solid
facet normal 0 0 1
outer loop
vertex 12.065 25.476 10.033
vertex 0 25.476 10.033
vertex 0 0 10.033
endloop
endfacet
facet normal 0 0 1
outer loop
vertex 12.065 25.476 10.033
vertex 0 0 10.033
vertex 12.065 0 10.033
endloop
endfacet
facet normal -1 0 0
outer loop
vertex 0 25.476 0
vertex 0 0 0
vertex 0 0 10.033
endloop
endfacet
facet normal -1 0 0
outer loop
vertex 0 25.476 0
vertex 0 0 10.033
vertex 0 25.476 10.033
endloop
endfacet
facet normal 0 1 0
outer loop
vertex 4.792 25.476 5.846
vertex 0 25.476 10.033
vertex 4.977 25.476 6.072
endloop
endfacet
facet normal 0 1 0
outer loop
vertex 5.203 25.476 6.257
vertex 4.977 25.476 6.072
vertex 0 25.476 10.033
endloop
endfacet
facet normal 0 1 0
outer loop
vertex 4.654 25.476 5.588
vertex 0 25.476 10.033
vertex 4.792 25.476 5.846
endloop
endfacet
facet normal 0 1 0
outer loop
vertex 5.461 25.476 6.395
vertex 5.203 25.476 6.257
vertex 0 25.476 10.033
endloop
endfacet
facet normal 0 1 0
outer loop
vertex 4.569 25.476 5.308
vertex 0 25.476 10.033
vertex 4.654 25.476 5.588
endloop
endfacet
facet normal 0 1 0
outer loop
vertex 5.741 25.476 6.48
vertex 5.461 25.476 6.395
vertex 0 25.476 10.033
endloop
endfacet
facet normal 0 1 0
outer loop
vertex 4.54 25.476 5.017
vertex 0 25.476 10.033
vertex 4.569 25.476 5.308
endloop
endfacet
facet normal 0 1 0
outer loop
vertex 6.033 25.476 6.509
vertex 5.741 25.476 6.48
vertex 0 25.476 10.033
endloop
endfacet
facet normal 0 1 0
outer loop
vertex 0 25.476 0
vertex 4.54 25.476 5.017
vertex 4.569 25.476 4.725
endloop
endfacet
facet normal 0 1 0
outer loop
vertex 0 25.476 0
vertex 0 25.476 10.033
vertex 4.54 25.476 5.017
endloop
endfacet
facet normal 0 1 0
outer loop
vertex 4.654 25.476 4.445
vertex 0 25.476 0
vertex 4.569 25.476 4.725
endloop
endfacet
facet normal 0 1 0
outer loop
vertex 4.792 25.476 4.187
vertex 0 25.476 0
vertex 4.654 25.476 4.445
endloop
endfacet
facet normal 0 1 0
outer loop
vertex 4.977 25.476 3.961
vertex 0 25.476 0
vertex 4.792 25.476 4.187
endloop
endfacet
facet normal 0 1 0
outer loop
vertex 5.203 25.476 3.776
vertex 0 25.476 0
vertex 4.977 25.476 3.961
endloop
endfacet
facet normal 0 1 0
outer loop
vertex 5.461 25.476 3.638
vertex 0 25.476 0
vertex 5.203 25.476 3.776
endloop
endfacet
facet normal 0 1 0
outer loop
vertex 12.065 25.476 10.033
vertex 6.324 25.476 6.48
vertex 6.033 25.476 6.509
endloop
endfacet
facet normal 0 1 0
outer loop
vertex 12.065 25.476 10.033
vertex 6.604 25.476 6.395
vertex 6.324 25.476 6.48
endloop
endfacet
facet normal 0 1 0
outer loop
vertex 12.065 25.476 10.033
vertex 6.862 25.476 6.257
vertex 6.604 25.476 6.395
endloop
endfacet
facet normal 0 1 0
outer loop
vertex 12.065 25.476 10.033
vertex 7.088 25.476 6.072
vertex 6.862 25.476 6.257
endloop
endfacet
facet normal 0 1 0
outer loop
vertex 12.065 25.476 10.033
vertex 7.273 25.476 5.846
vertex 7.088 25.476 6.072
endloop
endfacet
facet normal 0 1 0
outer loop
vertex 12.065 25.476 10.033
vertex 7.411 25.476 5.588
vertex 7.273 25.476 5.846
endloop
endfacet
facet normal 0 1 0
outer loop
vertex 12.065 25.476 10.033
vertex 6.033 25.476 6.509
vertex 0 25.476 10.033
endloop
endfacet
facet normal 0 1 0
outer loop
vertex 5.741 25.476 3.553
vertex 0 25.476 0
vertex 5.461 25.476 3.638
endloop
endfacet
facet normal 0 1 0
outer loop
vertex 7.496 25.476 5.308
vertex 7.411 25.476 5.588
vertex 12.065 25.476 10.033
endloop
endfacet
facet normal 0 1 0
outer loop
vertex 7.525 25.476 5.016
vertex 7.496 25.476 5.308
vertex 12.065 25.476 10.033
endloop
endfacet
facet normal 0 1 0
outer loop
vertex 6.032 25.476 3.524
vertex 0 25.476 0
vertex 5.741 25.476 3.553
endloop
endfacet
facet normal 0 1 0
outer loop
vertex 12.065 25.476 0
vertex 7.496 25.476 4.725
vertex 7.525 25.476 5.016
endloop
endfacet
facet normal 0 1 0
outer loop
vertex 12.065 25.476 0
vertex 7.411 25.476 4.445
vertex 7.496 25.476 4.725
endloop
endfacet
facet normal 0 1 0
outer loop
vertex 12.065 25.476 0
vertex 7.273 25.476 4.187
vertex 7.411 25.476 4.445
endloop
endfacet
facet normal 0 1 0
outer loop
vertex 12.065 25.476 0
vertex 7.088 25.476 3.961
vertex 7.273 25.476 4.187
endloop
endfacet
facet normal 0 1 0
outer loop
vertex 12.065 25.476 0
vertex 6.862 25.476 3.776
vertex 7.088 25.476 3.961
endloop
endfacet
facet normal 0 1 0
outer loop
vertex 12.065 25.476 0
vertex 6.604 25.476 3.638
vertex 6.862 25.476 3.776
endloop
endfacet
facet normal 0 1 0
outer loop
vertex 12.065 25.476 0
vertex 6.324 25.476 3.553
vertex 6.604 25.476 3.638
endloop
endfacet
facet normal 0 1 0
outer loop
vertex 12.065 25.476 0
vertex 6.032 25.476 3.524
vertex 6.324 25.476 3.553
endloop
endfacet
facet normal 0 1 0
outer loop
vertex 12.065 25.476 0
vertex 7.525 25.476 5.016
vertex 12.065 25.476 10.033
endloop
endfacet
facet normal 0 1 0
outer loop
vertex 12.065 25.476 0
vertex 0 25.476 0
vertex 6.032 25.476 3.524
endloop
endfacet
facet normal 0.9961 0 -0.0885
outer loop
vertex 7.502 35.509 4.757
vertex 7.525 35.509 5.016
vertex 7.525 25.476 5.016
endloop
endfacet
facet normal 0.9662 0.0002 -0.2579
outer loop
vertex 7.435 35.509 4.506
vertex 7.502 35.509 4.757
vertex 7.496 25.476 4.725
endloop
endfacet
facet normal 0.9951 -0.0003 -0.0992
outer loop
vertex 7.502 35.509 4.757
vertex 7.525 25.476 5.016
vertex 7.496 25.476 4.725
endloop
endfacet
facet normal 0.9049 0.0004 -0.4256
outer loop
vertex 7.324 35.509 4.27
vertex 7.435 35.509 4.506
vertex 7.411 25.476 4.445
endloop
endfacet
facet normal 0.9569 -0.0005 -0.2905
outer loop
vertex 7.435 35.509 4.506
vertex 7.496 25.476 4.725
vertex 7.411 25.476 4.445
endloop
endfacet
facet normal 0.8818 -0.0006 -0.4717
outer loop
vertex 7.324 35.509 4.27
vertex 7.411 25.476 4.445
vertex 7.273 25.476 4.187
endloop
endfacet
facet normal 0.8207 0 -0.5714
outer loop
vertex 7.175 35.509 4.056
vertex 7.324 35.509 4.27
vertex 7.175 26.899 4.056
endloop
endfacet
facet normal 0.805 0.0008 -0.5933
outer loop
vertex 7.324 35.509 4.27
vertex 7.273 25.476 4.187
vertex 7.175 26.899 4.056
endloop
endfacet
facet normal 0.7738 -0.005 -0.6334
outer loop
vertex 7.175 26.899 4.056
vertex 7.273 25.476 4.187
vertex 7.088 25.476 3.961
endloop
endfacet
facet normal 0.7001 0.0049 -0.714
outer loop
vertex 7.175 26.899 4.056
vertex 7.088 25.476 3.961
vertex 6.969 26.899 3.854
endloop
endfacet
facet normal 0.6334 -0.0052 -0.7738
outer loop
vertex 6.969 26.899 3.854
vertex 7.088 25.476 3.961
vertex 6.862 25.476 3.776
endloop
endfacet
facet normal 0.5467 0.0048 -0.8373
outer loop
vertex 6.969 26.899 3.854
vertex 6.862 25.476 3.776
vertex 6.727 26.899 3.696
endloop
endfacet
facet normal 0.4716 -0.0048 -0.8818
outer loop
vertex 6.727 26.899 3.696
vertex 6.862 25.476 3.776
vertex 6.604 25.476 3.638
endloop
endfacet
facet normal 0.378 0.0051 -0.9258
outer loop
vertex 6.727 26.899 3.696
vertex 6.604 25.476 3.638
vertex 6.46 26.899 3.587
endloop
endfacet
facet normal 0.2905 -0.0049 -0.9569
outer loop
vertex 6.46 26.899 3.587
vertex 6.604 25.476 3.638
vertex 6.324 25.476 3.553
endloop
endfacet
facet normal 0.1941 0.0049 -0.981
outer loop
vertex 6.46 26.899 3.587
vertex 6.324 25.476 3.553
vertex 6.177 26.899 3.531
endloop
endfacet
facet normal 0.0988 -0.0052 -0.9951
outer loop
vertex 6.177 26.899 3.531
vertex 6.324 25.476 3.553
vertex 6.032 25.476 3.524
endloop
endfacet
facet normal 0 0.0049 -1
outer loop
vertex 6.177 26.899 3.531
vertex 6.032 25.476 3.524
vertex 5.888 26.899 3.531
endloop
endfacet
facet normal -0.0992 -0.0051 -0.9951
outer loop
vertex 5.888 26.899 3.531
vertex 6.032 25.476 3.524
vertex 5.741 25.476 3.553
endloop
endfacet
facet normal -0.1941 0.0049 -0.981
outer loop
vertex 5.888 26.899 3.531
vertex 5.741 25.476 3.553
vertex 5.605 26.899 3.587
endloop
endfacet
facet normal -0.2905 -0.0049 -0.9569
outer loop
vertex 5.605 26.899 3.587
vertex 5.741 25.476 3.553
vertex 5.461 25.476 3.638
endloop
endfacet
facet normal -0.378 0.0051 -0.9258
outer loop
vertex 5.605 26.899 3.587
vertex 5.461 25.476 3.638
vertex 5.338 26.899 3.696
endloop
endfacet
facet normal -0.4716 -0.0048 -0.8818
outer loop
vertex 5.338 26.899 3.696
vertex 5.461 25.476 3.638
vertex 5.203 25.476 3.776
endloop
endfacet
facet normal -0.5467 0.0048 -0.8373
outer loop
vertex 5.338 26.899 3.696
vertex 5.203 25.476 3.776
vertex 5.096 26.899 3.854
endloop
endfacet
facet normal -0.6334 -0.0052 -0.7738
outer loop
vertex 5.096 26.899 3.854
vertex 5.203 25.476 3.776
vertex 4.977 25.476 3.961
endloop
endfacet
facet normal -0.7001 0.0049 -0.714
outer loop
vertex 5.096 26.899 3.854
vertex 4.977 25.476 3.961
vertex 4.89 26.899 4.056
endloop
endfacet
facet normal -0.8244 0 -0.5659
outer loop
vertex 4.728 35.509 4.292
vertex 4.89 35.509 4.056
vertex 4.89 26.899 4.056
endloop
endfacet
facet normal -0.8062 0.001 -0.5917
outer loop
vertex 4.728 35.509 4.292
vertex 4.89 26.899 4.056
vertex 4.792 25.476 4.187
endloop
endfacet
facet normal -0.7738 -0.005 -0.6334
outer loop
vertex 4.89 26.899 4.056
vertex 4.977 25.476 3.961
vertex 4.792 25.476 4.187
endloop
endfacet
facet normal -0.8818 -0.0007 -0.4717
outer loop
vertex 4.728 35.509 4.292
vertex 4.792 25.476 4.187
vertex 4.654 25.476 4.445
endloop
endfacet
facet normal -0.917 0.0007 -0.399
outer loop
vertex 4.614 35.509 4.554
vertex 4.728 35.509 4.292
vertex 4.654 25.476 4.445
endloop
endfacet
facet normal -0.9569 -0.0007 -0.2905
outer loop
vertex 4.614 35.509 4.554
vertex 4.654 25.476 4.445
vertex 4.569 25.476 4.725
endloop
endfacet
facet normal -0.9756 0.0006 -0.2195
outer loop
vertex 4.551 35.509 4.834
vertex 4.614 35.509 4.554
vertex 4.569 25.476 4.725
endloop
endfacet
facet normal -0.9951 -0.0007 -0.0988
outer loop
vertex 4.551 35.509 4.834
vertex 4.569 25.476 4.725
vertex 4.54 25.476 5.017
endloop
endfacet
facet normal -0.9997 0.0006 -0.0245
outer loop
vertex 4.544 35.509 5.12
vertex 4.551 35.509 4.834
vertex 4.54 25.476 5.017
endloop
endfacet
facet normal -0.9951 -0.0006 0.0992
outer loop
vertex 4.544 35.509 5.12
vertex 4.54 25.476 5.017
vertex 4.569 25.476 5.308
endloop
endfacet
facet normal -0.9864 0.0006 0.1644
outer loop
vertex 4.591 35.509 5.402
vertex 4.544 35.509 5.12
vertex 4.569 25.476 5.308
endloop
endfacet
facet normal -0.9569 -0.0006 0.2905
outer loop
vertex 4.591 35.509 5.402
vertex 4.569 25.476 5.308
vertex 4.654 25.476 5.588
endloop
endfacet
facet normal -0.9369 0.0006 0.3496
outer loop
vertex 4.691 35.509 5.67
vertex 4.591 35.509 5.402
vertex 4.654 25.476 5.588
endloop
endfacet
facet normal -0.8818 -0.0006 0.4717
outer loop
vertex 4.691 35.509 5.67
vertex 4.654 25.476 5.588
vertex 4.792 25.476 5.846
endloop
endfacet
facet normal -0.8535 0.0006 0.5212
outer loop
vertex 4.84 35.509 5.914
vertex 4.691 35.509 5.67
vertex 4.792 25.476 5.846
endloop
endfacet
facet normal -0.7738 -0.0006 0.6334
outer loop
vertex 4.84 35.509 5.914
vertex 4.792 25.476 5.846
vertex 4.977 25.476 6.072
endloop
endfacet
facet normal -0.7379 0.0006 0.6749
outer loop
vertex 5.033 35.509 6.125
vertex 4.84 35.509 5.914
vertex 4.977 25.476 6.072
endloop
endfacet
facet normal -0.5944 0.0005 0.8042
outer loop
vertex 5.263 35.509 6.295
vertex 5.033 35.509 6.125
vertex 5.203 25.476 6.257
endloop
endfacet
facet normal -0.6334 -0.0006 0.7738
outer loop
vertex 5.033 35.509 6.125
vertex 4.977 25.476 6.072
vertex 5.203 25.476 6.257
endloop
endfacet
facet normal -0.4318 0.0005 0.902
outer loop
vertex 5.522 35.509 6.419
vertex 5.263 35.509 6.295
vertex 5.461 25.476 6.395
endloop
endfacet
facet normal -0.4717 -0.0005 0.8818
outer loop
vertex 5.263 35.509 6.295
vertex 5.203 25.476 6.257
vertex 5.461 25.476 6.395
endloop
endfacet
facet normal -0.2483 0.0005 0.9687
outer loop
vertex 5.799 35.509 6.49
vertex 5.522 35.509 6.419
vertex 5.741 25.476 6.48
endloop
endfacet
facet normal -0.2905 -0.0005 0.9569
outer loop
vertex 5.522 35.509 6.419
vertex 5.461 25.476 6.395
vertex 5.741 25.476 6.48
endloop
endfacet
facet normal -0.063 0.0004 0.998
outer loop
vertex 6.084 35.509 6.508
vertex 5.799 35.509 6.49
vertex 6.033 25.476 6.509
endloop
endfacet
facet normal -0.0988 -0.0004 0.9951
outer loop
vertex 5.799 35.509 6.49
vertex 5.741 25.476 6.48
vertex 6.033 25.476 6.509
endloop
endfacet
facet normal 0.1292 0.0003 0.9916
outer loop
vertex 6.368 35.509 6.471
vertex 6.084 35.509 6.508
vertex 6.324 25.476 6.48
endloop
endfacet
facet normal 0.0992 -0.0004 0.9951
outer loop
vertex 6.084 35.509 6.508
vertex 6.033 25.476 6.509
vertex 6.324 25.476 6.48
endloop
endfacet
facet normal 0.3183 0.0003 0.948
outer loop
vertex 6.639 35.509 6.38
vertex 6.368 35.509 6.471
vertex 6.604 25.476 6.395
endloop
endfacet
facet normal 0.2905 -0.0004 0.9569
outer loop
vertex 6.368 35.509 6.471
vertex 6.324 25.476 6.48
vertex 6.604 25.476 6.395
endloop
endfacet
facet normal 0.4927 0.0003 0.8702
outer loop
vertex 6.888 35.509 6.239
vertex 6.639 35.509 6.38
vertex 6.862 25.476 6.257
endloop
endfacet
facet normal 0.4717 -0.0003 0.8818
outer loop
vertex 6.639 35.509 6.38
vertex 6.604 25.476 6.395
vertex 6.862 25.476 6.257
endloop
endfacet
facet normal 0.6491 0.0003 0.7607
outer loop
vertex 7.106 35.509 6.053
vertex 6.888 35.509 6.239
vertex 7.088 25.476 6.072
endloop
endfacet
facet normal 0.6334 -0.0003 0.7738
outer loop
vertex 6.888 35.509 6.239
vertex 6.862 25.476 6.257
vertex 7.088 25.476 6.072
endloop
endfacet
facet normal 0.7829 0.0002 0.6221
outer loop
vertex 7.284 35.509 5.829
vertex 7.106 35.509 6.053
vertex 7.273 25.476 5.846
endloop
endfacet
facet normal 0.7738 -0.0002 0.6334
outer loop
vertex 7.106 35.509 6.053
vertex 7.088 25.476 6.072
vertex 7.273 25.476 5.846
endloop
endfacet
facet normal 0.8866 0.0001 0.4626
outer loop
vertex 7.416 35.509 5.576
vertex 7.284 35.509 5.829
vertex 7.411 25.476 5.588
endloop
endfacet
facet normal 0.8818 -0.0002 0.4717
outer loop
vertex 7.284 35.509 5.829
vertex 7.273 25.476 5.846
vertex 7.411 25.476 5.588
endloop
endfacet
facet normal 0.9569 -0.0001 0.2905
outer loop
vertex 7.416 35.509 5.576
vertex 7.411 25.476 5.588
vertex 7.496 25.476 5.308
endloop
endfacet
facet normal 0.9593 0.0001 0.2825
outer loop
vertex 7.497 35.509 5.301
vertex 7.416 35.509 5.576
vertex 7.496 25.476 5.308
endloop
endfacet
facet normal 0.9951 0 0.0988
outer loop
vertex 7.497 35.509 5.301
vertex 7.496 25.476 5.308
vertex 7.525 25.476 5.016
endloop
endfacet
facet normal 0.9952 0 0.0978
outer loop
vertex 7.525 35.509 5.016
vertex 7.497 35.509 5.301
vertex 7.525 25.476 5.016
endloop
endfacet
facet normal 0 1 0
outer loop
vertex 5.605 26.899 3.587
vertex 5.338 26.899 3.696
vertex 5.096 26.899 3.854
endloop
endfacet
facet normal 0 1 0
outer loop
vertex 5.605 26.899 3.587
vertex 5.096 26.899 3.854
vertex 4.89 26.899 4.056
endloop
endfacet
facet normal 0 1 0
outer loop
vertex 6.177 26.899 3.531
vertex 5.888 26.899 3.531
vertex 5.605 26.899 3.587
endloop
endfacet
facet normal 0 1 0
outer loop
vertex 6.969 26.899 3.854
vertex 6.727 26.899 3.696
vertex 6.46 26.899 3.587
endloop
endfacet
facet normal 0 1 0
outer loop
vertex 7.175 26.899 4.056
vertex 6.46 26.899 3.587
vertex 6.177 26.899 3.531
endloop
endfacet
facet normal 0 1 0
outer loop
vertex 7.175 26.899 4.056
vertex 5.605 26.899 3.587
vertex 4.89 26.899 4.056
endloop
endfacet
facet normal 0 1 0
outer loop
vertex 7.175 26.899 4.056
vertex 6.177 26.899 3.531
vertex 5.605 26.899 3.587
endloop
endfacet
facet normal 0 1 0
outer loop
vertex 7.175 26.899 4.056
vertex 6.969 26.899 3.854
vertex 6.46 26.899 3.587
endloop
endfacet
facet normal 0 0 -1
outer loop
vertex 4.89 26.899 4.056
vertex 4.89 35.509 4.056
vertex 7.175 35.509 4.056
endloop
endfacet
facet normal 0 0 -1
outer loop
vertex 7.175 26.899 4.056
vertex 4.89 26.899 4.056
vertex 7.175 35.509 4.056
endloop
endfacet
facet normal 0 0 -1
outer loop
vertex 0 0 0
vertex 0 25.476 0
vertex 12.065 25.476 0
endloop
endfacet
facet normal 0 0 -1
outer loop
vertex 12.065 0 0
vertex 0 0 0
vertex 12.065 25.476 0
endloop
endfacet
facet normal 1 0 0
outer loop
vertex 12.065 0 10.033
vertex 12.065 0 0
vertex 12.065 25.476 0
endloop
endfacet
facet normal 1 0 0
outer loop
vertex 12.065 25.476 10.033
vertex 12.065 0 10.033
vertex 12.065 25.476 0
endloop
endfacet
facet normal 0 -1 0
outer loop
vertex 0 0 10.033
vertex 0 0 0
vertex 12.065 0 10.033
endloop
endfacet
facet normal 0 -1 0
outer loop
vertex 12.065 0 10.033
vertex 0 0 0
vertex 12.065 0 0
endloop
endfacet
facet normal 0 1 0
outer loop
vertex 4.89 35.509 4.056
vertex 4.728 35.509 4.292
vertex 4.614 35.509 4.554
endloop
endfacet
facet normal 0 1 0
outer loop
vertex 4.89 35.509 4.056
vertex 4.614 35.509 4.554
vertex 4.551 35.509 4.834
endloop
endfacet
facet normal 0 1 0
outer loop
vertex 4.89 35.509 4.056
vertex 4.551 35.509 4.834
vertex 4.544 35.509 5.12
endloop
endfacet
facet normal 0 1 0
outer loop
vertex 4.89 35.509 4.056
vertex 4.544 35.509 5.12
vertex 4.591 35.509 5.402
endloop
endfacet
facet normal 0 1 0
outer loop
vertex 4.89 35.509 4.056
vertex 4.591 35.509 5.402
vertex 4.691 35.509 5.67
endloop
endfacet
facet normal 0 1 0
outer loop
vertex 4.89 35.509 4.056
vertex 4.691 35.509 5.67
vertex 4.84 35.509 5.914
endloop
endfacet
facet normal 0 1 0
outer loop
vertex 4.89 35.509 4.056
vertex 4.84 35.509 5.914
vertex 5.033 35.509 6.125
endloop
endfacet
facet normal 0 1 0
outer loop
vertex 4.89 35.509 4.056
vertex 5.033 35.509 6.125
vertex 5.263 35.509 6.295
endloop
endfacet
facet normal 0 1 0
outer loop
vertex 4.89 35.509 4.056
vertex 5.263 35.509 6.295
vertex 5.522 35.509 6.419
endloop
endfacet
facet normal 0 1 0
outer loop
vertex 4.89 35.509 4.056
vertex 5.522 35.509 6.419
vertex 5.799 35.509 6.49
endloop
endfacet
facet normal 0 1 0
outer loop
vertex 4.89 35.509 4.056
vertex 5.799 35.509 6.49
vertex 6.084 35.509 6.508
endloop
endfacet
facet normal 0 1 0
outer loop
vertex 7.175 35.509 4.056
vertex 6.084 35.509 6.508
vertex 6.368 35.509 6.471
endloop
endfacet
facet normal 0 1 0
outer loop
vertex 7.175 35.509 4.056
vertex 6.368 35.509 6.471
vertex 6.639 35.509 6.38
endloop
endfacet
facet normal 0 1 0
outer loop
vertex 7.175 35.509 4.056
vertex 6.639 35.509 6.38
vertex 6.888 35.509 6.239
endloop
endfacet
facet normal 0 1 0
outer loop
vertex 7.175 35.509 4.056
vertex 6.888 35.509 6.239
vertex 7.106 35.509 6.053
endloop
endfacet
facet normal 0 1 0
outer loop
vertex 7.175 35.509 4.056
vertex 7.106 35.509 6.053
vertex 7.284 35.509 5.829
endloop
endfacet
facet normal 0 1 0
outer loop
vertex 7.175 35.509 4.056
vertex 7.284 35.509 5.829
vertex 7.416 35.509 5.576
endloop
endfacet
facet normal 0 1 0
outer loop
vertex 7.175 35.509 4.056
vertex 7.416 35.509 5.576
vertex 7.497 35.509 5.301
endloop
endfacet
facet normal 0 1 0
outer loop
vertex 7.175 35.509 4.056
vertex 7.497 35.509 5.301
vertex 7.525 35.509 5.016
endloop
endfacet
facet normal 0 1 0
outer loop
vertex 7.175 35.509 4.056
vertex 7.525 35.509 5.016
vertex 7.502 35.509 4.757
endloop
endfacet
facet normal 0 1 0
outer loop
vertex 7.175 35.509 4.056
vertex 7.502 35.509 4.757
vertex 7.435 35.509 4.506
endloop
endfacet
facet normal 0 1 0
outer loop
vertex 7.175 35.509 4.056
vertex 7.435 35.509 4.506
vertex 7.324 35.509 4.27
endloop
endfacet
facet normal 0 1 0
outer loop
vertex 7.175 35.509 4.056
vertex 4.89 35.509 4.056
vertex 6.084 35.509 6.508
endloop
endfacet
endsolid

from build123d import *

# Parameters (mm, degrees)
SKETCH1_W           = 12.065
SKETCH1_H           = 25.4762
BOSS_EXTRUDE1_DEPTH = 10.033
SKETCH2_R           = 1.49225
BOSS_EXTRUDE2_DEPTH = 10.033
CUT_EXTRUDE1_DEPTH  = 8.6106


with BuildPart() as part:
    # Sketch1 → Boss-Extrude1 (new body)
    with BuildSketch(Plane.XY):
        with Locations((6.0325, 12.7381)):
            Rectangle(SKETCH1_W, SKETCH1_H)
    extrude(amount=BOSS_EXTRUDE1_DEPTH)

    # Sketch2 → Boss-Extrude2 (add)
    with BuildSketch(Plane(origin=(0, 25.4762, 0), x_dir=(1, 0, 0), z_dir=(0, 1, 0))):
        with Locations((6.0325, -5.0165)):
            Circle(SKETCH2_R)
    extrude(amount=BOSS_EXTRUDE2_DEPTH)

    # Sketch3 → Cut-Extrude1 (cut)
    with BuildSketch(Plane(origin=(0, 35.5092, 0), x_dir=(1, 0, 0), z_dir=(0, 1, 0))):
        with BuildLine():
            Line((4.890142942, -4.05638), (7.174857058, -4.05638))
            ThreePointArc((7.174857058, -4.05638), (6.0325, -3.52425), (4.890142942, -4.05638))
        make_face()
    extrude(amount=-CUT_EXTRUDE1_DEPTH, mode=Mode.SUBTRACT)


solid = part.part
